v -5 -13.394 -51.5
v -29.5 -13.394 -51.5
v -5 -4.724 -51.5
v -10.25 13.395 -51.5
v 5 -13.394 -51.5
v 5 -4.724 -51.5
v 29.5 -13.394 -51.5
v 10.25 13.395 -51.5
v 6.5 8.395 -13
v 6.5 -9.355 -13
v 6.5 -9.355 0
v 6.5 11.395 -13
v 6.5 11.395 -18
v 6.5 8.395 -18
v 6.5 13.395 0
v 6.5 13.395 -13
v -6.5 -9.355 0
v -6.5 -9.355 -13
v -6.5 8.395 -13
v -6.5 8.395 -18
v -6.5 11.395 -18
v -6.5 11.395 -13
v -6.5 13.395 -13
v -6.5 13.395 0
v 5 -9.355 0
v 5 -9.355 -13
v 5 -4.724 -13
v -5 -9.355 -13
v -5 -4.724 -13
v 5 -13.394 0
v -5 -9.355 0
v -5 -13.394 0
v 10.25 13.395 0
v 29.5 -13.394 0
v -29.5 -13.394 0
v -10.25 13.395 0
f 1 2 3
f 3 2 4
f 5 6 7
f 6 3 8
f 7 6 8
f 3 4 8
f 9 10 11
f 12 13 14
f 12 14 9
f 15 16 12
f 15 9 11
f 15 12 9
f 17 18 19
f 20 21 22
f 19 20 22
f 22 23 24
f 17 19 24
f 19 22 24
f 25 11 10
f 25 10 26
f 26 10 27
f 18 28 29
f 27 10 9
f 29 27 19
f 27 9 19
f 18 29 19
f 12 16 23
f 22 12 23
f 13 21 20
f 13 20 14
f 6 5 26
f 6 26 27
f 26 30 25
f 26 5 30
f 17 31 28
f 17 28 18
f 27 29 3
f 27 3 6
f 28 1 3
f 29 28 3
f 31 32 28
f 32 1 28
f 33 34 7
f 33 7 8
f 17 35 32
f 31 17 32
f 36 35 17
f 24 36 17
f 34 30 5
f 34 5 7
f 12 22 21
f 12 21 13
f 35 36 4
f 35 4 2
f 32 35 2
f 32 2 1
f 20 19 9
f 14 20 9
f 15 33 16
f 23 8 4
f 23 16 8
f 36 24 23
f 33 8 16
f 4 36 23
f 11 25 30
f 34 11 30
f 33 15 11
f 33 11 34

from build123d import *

# Parameters (mm, degrees)
F1_DEPTH = 51.5
F2_W     = 13
F2_H     = 13
F3_DEPTH = 22.75
F4_W     = 13
F4_H     = 3
F5_DEPTH = 5
F6_W     = 10
F6_H     = 8.67
F7_DEPTH = 51.5


with BuildPart() as f1:
    # F0 (on Top) → F1 (new body)
    with BuildSketch(Plane.XY):
        Polygon((-10.25, 13.39471), (-29.5, -13.3945), (29.5, -13.3945), (10.25, 13.39471), align=None)
    extrude(amount=-F1_DEPTH)

    # F2 (on face) → F3 (cut)
    with BuildSketch(Plane(origin=(0, 13.39471, 0), x_dir=(-1, 0, 0), z_dir=(0, 1, 0))):
        with Locations((0, -6.5)):
            Rectangle(F2_W, F2_H)
    extrude(amount=-F3_DEPTH, mode=Mode.SUBTRACT)

    # F4 (on face) → F5 (cut)
    with BuildSketch(Plane.XY.offset(-13)):
        with Locations((0, 9.89471)):
            Rectangle(F4_W, F4_H)
    extrude(amount=-F5_DEPTH, mode=Mode.SUBTRACT)

    # F6 (on face) → F7 (cut)
    with BuildSketch(Plane.XY):
        with Locations((0, -9.0595)):
            Rectangle(F6_W, F6_H)
    extrude(amount=-F7_DEPTH, mode=Mode.SUBTRACT)


solid = f1.part
